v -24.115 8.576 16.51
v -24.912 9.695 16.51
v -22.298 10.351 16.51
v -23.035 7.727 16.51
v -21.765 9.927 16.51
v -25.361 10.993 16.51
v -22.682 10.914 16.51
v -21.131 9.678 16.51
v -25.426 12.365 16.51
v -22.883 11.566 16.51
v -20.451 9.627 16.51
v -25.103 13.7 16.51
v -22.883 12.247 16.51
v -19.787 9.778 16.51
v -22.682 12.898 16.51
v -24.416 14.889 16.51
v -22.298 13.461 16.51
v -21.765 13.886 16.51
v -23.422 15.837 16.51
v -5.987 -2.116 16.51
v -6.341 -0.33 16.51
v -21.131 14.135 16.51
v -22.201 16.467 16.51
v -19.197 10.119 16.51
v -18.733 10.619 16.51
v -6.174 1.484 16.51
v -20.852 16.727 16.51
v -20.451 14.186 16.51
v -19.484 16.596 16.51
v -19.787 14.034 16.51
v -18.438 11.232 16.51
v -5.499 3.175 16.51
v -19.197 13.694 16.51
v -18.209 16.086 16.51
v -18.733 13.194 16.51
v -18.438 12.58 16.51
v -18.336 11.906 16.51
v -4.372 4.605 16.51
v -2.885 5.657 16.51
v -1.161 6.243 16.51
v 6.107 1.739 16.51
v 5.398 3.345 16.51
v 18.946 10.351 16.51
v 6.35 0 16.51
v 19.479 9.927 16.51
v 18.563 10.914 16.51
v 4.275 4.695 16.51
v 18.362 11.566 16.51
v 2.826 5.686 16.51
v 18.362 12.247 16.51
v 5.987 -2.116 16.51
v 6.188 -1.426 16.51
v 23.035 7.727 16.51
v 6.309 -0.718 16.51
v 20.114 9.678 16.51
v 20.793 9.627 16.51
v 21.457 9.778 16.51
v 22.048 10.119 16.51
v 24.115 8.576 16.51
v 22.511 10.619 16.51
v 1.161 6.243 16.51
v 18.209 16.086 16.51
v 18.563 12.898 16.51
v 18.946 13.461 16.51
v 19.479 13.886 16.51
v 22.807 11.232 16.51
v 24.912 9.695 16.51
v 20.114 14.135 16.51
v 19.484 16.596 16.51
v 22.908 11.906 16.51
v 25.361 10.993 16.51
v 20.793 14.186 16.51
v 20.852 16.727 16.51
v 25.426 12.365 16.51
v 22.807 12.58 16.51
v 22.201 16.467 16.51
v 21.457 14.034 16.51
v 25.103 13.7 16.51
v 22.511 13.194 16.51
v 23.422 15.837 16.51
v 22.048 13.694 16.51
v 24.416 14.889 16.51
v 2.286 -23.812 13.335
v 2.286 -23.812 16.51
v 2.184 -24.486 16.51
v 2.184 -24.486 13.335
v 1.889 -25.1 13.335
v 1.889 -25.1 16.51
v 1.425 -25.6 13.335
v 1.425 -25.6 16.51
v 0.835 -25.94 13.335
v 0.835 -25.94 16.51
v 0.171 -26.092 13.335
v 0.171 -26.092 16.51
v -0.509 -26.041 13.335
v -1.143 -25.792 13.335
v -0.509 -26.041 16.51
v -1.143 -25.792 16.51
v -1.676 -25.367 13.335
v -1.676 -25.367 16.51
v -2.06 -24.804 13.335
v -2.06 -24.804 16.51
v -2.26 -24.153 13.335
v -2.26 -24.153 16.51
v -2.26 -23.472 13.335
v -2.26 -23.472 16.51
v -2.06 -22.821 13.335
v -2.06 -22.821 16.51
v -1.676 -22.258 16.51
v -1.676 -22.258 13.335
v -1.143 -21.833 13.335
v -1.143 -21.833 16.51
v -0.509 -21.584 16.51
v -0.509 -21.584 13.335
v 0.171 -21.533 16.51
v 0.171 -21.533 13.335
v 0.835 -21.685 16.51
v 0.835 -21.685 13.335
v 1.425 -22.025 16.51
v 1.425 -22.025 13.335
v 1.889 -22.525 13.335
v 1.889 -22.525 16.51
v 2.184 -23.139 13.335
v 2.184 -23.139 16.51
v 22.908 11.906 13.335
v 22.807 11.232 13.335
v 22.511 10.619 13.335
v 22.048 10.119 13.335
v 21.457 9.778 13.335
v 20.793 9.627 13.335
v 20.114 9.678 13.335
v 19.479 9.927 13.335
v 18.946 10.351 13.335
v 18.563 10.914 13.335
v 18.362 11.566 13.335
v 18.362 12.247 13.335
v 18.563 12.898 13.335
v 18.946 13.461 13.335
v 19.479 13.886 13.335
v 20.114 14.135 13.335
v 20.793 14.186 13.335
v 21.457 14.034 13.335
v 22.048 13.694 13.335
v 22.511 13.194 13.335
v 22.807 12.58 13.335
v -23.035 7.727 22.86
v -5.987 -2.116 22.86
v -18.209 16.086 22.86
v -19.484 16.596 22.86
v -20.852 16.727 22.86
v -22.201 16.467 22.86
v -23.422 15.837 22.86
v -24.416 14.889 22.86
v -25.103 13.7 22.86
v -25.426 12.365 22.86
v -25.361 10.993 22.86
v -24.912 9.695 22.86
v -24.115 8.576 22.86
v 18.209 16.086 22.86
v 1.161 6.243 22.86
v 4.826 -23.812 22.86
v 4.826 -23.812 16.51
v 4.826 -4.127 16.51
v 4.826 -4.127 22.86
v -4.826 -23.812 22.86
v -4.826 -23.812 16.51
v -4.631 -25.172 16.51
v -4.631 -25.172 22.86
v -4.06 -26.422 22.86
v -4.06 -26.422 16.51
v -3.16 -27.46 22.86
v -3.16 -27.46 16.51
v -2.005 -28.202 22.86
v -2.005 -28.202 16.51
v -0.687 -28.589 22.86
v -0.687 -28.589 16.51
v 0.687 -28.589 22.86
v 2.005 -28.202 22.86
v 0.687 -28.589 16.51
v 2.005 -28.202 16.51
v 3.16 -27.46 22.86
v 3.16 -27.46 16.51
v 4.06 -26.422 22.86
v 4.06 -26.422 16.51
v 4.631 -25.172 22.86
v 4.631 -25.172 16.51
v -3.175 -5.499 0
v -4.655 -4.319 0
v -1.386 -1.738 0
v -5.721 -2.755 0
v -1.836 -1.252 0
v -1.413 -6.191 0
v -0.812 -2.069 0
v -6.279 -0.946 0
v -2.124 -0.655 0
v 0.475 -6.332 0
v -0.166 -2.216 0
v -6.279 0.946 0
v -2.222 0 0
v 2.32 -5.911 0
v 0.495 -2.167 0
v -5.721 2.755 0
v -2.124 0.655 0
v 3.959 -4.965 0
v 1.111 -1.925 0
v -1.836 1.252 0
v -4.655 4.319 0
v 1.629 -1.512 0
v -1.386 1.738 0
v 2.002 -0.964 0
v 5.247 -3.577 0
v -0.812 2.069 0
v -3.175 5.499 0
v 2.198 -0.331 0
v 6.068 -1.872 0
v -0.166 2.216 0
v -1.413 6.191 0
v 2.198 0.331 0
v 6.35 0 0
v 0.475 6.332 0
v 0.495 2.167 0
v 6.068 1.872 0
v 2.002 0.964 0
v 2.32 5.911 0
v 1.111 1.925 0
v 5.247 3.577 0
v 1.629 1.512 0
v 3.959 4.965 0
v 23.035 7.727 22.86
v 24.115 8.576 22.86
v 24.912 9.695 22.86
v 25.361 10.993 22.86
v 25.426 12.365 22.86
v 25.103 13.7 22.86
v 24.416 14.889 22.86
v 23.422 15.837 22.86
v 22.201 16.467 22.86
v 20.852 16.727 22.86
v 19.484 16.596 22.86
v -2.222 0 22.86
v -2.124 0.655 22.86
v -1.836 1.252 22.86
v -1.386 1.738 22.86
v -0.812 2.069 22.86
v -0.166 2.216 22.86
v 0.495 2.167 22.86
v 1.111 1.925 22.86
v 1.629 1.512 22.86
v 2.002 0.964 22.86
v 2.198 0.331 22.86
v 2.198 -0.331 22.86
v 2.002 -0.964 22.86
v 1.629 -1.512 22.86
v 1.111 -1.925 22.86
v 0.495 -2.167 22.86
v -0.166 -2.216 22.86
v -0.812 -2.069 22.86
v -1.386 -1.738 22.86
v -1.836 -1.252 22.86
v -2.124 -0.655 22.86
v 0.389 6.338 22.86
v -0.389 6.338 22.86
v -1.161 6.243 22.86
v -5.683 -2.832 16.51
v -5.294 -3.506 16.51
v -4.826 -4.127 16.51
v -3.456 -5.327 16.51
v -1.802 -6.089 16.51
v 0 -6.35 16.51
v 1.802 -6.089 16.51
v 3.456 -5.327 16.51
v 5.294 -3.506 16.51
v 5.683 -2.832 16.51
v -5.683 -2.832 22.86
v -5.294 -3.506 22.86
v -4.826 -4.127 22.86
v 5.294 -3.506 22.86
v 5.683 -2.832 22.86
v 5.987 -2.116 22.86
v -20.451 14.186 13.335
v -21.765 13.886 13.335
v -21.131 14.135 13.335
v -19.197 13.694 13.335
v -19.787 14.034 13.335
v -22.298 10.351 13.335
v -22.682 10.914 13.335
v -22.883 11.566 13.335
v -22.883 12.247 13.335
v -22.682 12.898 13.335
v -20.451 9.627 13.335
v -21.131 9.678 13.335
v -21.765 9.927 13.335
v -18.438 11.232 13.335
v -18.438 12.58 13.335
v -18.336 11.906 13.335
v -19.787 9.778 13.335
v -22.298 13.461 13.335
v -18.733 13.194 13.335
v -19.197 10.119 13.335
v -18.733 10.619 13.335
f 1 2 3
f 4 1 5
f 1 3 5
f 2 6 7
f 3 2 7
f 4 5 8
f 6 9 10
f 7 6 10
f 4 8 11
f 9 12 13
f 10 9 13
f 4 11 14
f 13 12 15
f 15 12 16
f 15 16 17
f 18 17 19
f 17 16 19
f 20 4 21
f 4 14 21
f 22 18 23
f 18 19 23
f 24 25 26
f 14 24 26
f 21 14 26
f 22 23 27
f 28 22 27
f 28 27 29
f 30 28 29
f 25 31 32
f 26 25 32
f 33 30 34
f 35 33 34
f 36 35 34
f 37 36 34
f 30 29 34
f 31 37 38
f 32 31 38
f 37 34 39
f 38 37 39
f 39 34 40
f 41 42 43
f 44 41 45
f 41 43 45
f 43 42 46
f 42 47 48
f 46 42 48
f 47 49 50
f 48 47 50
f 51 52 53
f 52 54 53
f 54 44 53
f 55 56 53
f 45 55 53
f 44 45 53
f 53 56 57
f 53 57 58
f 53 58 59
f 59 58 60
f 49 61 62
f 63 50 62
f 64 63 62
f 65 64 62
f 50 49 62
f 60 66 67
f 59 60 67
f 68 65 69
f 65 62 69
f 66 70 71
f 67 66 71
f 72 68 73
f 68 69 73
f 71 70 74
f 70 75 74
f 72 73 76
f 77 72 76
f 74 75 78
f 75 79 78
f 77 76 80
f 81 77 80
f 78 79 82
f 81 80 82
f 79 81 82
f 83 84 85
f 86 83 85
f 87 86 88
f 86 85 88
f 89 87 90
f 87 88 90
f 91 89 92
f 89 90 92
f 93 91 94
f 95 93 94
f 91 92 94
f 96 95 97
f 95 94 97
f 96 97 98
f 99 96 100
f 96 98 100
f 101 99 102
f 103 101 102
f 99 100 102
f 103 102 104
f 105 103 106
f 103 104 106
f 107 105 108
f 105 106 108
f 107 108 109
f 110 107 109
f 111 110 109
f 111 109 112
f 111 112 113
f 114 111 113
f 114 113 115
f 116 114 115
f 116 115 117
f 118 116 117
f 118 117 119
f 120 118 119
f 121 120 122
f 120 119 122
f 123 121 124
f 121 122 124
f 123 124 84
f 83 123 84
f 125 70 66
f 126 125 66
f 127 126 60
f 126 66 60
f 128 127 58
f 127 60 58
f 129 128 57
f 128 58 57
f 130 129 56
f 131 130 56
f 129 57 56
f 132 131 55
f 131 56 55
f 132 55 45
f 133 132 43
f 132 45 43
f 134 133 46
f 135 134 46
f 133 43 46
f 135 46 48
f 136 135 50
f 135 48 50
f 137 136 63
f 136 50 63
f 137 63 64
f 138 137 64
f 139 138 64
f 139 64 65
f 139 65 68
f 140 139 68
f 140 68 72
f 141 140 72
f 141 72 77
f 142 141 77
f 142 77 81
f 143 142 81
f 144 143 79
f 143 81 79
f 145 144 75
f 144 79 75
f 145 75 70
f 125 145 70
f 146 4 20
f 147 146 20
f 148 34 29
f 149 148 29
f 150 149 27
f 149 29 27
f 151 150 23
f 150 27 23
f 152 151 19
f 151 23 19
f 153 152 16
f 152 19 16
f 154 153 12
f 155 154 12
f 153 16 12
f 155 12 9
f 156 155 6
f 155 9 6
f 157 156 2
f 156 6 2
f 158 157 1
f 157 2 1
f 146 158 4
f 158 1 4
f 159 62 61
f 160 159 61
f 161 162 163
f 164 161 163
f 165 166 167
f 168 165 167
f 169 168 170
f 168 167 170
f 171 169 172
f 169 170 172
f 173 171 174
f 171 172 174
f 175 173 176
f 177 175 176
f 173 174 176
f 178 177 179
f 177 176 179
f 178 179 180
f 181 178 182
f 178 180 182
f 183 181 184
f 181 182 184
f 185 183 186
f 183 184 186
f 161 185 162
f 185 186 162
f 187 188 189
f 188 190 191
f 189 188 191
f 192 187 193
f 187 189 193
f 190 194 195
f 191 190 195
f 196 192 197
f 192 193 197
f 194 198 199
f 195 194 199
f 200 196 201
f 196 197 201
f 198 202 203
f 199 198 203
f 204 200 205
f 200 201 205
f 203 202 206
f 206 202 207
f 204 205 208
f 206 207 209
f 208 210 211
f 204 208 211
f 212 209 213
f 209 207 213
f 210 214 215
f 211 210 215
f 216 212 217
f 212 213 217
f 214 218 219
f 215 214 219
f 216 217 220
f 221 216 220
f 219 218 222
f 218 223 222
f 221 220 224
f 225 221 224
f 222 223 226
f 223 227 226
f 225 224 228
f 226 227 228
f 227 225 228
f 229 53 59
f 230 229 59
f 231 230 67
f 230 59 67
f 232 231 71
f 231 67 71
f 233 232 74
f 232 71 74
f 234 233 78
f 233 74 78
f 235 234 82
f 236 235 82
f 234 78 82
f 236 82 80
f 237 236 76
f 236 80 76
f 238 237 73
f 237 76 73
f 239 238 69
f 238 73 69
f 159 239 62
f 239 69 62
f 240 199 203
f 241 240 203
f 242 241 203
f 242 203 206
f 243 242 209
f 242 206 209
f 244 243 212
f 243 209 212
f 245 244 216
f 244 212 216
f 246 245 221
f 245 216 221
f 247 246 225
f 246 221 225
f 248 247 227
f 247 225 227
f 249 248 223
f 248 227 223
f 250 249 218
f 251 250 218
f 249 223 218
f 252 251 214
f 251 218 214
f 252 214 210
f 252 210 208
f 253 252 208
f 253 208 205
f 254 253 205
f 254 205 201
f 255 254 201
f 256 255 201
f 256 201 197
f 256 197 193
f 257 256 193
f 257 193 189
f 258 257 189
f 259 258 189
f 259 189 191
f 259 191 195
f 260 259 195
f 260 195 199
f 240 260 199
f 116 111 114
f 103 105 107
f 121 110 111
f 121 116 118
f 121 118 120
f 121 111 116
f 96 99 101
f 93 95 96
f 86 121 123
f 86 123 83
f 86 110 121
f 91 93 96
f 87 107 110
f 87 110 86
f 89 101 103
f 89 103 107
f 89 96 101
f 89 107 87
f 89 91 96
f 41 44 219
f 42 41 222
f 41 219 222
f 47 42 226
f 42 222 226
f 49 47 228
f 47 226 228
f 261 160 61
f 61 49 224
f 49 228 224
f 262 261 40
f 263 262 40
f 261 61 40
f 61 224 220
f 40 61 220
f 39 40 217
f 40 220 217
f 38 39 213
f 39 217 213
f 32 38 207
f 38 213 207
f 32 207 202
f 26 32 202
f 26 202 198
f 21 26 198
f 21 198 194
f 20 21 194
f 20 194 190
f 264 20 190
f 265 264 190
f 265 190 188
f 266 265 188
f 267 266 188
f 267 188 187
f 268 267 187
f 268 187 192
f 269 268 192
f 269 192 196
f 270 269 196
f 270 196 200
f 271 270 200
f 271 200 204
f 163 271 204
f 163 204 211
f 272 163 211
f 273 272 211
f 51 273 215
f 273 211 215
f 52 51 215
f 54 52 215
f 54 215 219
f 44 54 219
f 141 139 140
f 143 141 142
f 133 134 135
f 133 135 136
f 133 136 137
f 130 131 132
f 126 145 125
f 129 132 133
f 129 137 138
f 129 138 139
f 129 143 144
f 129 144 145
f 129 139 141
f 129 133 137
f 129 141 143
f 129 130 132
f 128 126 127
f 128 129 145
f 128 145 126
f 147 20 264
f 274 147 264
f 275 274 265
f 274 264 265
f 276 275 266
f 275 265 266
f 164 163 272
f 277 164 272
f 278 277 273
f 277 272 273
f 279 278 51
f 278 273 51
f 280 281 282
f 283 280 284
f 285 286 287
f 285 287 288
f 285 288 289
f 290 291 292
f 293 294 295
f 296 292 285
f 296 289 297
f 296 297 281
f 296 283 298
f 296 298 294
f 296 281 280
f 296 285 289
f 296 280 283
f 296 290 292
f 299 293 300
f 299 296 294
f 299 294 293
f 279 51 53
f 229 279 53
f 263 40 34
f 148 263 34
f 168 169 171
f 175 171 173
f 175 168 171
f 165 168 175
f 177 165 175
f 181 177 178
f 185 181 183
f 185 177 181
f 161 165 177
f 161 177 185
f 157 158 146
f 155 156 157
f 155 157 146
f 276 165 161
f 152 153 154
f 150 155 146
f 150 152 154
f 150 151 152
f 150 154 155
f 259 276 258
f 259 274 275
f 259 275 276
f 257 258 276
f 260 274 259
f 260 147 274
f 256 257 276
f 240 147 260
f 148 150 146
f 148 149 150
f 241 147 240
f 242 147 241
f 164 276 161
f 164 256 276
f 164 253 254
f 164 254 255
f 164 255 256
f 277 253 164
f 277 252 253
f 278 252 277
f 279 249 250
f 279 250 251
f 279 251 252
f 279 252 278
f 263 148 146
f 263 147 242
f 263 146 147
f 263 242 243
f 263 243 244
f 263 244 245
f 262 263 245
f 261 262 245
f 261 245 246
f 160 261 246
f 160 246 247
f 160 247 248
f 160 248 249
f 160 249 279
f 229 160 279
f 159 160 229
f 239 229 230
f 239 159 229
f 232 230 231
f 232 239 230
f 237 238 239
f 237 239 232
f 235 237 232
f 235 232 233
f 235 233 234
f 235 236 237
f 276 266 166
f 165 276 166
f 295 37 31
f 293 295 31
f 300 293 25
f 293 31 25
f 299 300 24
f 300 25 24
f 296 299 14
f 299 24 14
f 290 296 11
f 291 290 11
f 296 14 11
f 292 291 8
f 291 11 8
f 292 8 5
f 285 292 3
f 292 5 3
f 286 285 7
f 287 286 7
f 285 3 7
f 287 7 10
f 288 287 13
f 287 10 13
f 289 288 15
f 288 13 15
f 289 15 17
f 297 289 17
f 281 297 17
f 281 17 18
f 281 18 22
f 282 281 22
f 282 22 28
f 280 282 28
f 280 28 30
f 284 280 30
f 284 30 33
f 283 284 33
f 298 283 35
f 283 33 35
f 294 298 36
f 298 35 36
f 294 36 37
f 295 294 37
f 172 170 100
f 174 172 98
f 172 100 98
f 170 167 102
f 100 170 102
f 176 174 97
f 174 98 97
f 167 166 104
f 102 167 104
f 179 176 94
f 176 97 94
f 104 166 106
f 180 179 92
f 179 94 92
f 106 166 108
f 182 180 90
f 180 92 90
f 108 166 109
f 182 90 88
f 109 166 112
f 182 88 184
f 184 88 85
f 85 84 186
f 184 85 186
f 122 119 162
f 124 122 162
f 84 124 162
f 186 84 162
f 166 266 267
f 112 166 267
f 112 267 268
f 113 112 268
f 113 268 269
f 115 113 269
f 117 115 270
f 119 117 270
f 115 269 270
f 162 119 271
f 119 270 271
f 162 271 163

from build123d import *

# Parameters (mm, degrees)
SKETCH1_R           = 6.35
BOSS_EXTRUDE1_DEPTH = 16.51
BOSS_EXTRUDE4_DEPTH = 6.35
SKETCH6_R           = 2.286
BOSS_EXTRUDE5_DEPTH = 3.175
SKETCH7_R           = 2.2225
CUT_EXTRUDE1_DEPTH  = 45.613402568


with BuildPart() as part:
    # Sketch1 → Boss-Extrude1 (new body)
    with BuildSketch(Plane.XY):
        Circle(SKETCH1_R)
    extrude(amount=BOSS_EXTRUDE1_DEPTH)

    # Sketch4 → Boss-Extrude4 (add)
    with BuildSketch(Plane.XY.offset(16.51)):
        with BuildLine():
            Line((-4.826, -4.12701151), (-4.826, -23.8125))
            ThreePointArc((-4.826, -23.8125), (0, -28.6385), (4.826, -23.8125))
            Line((4.826, -23.8125), (4.826, -4.12701151))
            ThreePointArc((4.826, -4.12701151), (5.499261314, -3.175), (5.987096809, -2.115932844))
            Line((5.987096809, -2.115932844), (23.035229928, 7.726811401))
            ThreePointArc((23.035229928, 7.726811401), (24.801668526, 14.31925), (18.209229928, 16.085688599))
            Line((18.209229928, 16.085688599), (1.161096809, 6.242944353))
            ThreePointArc((1.161096809, 6.242944353), (0, 6.35), (-1.161096809, 6.242944353))
            Line((-1.161096809, 6.242944353), (-18.209229928, 16.085688599))
            ThreePointArc((-18.209229928, 16.085688599), (-24.801668526, 14.31925), (-23.035229928, 7.726811401))
            Line((-23.035229928, 7.726811401), (-5.987096809, -2.115932844))
            ThreePointArc((-5.987096809, -2.115932844), (-5.499261314, -3.175), (-4.826, -4.12701151))
        make_face()
    extrude(amount=BOSS_EXTRUDE4_DEPTH)

    # Sketch6 → Boss-Extrude5 (add)
    with BuildSketch(Plane(origin=(0, 0, 16.51), x_dir=(-1, 0, 0), z_dir=(0, 0, -1))):
        with Locations(Location((0, -23.8125, 0), (0, 0, 180))):
            Circle(SKETCH6_R)
        with Locations(Location((-20.622229928, 11.90625, 0), (0, 0, 180))):
            Circle(SKETCH6_R)
        with Locations(Location((20.622229928, 11.90625, 0), (0, 0, 180))):
            Circle(SKETCH6_R)
    extrude(amount=BOSS_EXTRUDE5_DEPTH)

    # Sketch7 → Cut-Extrude1 (cut, through all)
    with BuildSketch(Plane(origin=(0, 0, 0), x_dir=(-1, 0, 0), z_dir=(0, 0, -1))):
        Circle(SKETCH7_R)
    extrude(amount=-CUT_EXTRUDE1_DEPTH, mode=Mode.SUBTRACT)


solid = part.part
